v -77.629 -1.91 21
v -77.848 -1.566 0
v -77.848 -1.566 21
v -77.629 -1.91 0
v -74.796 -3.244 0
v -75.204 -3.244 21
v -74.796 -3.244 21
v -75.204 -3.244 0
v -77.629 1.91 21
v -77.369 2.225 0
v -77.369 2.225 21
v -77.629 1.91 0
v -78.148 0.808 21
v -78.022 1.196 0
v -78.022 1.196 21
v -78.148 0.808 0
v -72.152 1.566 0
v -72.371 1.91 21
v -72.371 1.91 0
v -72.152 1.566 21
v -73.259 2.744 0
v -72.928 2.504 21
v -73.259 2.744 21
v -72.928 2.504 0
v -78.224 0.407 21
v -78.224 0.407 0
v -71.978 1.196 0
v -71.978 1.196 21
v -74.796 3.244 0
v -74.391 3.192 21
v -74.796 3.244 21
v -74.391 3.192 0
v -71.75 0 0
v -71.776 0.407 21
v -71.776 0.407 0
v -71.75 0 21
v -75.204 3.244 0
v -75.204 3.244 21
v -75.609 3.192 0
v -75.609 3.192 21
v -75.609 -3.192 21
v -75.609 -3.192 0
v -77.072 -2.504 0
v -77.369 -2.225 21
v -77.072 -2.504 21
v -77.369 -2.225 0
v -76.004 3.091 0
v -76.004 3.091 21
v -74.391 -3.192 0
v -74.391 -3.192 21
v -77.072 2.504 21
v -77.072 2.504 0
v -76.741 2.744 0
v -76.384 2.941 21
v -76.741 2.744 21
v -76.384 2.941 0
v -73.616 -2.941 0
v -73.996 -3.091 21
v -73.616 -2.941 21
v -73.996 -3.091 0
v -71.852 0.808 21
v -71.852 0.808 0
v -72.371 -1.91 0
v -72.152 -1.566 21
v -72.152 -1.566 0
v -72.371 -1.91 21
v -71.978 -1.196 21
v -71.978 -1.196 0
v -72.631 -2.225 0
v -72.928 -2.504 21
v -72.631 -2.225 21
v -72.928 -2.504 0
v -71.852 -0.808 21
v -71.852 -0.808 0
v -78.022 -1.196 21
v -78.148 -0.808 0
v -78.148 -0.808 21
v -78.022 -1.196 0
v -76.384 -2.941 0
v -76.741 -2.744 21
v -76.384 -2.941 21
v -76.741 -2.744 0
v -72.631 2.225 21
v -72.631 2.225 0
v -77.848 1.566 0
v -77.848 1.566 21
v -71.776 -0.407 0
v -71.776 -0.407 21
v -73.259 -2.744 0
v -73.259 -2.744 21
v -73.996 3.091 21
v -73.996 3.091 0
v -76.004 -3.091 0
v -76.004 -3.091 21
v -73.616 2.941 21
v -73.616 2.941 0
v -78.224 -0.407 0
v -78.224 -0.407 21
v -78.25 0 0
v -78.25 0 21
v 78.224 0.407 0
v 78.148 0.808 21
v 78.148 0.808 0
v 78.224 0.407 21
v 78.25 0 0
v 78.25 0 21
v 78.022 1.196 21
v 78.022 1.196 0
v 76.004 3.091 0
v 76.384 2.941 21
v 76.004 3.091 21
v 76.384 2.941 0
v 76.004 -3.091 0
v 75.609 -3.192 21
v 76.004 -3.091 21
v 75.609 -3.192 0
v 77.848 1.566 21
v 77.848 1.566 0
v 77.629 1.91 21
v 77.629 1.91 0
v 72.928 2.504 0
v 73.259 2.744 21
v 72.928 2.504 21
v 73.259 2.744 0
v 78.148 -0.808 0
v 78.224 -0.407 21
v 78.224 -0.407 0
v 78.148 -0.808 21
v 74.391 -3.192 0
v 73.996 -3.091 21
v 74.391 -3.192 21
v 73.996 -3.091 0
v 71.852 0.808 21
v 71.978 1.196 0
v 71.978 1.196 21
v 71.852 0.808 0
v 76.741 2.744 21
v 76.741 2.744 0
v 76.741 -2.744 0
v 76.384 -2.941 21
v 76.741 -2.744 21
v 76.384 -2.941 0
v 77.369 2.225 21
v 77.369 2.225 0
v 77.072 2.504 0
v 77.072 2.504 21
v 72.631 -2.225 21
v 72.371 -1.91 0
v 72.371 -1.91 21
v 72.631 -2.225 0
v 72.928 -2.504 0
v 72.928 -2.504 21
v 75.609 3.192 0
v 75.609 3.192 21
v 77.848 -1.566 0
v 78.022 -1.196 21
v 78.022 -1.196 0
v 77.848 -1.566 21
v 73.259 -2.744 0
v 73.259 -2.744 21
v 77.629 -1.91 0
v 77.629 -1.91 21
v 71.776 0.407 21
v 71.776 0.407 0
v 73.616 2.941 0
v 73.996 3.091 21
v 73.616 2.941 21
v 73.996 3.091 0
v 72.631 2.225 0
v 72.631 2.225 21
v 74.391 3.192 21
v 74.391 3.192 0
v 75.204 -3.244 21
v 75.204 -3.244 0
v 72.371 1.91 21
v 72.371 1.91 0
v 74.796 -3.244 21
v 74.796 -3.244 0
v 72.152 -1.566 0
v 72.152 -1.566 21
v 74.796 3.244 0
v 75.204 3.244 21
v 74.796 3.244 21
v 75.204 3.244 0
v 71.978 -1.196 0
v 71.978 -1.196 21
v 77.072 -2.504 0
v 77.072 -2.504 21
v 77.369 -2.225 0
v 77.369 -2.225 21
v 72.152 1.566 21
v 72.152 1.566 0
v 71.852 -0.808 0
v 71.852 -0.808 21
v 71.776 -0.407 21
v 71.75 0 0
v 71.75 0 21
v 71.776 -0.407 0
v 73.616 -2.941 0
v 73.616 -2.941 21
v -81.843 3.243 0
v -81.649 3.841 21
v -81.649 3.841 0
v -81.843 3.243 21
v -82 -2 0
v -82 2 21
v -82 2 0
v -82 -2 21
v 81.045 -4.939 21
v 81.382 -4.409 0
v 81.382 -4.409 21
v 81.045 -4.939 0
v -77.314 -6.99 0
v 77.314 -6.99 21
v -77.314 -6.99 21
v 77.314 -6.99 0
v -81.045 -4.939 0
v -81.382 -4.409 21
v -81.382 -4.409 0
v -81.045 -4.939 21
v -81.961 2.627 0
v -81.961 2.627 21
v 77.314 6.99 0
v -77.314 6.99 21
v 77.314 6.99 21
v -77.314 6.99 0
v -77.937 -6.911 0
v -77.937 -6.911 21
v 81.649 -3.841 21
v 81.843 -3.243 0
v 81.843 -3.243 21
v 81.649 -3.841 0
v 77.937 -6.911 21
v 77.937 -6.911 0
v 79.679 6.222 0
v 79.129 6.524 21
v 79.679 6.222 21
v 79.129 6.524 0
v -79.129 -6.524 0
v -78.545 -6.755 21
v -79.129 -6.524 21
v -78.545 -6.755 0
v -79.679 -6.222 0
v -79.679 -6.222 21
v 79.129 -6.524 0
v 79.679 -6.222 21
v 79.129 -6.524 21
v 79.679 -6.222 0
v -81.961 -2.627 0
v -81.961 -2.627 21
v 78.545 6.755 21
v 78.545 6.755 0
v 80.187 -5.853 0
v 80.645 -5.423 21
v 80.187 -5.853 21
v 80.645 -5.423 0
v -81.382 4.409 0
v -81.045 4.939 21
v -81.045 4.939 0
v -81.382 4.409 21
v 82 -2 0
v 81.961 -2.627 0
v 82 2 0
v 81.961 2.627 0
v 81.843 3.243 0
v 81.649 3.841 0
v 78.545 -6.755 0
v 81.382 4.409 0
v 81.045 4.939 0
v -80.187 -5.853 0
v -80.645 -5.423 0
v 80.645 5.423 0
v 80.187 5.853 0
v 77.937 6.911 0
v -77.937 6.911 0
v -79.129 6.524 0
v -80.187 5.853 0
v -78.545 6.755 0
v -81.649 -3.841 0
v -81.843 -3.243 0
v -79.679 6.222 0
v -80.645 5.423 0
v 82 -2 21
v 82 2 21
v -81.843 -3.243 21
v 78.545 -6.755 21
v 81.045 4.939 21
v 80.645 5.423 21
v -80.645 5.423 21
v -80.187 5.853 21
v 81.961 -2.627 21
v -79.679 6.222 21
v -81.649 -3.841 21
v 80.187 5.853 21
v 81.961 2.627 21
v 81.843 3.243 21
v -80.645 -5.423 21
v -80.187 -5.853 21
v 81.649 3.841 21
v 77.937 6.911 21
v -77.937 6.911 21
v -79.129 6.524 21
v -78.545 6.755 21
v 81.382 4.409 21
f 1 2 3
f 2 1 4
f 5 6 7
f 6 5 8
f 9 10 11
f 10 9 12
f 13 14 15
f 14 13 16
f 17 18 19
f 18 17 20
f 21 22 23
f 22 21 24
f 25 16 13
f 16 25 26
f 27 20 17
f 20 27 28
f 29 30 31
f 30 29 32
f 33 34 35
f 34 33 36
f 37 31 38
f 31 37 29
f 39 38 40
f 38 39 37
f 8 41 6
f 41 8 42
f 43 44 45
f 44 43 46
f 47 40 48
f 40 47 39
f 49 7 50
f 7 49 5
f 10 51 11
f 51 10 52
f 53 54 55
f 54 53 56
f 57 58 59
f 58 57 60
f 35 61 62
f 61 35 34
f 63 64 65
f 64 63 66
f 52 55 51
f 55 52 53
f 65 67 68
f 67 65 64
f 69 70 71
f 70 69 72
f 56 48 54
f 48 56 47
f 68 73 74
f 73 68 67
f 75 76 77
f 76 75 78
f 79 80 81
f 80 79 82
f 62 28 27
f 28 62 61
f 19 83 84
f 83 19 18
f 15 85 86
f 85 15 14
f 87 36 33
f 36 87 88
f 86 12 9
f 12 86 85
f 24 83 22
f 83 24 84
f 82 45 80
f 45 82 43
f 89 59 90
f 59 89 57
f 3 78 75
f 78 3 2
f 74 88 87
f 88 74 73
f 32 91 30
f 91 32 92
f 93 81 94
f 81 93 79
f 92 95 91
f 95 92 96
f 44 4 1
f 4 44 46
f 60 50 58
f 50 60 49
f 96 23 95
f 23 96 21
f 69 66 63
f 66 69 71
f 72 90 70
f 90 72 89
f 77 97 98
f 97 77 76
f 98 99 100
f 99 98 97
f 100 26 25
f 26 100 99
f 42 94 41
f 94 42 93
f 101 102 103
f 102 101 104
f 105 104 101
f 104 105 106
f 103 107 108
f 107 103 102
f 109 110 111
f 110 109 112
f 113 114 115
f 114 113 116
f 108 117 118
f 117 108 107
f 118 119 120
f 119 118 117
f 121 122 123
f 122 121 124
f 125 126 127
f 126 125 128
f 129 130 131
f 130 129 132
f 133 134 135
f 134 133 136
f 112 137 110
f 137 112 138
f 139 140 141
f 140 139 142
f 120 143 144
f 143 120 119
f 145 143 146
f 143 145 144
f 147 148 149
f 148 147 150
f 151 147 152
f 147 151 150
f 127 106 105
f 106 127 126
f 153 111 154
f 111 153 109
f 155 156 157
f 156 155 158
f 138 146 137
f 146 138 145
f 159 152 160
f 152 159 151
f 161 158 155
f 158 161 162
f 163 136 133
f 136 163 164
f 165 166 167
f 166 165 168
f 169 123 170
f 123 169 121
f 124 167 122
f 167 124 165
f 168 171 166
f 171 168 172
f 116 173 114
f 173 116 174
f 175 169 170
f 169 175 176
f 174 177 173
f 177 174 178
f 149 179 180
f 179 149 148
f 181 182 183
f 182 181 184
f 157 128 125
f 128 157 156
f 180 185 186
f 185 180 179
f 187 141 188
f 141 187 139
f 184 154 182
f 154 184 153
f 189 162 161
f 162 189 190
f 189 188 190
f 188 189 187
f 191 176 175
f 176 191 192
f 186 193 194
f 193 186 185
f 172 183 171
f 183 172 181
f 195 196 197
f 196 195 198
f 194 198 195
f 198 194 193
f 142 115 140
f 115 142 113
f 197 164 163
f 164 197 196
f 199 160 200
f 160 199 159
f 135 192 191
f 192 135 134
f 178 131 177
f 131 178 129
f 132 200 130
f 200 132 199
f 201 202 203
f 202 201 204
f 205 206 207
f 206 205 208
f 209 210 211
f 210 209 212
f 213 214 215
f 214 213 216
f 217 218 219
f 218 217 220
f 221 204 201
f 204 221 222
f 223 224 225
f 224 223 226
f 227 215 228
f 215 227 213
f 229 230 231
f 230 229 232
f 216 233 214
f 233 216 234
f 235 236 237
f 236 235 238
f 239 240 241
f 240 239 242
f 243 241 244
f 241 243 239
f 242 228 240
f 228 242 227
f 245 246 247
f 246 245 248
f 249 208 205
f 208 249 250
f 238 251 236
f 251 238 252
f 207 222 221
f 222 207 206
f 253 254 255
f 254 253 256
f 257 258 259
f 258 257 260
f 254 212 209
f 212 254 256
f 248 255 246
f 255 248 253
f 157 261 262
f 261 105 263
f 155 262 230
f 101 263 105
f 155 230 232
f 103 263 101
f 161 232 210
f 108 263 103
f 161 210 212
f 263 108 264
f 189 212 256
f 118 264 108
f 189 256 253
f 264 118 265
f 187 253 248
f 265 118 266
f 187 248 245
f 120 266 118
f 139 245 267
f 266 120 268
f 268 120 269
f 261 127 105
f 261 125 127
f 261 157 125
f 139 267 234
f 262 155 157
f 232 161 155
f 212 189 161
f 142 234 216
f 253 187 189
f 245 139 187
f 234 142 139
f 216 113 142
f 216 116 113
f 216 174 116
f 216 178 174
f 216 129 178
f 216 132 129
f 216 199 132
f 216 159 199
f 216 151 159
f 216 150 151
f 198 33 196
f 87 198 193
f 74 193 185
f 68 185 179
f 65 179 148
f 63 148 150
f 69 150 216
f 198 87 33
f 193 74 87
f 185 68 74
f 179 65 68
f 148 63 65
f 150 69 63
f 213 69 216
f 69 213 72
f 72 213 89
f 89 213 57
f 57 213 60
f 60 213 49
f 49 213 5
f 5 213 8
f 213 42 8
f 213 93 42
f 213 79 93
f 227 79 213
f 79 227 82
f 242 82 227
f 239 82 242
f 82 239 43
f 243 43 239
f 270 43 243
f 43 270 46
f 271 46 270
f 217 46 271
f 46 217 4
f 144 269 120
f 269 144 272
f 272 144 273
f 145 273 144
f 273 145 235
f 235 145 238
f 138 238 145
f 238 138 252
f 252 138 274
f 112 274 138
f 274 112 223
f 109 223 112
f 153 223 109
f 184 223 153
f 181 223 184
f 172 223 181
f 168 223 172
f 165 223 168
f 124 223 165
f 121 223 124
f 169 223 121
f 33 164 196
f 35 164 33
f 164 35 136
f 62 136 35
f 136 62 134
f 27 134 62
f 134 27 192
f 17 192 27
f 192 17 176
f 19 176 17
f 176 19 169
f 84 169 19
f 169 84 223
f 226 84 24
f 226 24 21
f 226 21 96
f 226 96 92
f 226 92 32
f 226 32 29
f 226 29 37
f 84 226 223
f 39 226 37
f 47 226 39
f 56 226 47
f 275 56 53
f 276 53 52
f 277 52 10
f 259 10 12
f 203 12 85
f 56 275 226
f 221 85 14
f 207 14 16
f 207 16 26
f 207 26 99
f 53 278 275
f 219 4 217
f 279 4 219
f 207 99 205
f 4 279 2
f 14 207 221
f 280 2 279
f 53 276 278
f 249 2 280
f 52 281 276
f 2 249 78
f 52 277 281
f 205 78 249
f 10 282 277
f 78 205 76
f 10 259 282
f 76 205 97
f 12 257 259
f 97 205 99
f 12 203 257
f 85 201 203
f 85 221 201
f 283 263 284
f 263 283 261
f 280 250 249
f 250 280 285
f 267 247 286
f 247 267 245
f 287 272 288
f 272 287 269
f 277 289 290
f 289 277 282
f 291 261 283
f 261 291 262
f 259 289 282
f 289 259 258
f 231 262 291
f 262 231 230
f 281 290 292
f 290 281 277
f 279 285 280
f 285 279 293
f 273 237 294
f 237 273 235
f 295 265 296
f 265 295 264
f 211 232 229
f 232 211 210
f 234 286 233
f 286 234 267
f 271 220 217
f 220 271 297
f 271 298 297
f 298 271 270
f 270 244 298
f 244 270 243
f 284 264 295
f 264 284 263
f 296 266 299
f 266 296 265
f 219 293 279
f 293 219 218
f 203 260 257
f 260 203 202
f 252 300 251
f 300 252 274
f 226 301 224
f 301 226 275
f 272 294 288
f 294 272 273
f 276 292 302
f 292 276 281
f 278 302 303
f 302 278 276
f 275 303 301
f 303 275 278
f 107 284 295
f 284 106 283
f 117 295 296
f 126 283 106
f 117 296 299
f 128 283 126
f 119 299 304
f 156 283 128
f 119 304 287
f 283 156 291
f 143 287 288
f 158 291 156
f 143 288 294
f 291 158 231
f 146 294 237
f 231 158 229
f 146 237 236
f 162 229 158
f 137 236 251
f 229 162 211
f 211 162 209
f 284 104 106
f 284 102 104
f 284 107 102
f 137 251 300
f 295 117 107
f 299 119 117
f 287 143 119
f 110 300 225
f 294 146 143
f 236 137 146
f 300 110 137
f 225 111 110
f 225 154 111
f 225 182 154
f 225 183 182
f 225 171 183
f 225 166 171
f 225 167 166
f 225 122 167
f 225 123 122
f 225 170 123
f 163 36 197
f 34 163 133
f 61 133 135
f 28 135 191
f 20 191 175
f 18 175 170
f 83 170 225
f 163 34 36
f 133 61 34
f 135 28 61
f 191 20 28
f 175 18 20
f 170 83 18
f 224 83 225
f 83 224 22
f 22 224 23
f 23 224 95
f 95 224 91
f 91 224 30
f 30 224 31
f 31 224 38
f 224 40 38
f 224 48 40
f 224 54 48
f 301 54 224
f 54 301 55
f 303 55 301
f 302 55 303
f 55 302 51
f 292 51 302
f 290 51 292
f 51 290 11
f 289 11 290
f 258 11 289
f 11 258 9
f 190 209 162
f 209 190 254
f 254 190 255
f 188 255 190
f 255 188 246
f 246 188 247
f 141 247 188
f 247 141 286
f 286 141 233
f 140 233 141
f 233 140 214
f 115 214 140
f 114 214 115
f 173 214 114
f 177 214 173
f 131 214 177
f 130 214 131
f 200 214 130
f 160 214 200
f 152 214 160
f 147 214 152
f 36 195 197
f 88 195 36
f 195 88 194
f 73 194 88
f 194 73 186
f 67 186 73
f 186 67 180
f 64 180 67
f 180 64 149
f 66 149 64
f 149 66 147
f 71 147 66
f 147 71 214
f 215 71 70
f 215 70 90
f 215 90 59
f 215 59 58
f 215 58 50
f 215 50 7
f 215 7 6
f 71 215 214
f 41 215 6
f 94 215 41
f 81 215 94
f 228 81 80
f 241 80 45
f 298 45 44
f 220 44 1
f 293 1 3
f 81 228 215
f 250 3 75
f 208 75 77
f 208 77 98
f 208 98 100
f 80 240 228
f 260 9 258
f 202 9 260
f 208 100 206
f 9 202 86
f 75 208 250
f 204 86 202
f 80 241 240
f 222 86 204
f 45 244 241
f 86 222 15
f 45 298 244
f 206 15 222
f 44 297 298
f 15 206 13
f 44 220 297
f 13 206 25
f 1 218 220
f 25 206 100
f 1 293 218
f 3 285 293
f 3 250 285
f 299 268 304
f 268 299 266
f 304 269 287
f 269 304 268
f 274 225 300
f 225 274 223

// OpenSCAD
$fn = 50;


difference() {
	union() {
		hull() {
			translate(v = [-77.0000000000, 2.0000000000, 0]) {
				cylinder(h = 21, r = 5);
			}
			translate(v = [77.0000000000, 2.0000000000, 0]) {
				cylinder(h = 21, r = 5);
			}
			translate(v = [-77.0000000000, -2.0000000000, 0]) {
				cylinder(h = 21, r = 5);
			}
			translate(v = [77.0000000000, -2.0000000000, 0]) {
				cylinder(h = 21, r = 5);
			}
		}
	}
	union() {
		translate(v = [-75.0000000000, 0.0000000000, -100.0000000000]) {
			cylinder(h = 200, r = 3.2500000000);
		}
		translate(v = [-75.0000000000, 0.0000000000, -100.0000000000]) {
			cylinder(h = 200, r = 3.2500000000);
		}
		translate(v = [75.0000000000, 0.0000000000, -100.0000000000]) {
			cylinder(h = 200, r = 3.2500000000);
		}
		translate(v = [75.0000000000, 0.0000000000, -100.0000000000]) {
			cylinder(h = 200, r = 3.2500000000);
		}
	}
}
